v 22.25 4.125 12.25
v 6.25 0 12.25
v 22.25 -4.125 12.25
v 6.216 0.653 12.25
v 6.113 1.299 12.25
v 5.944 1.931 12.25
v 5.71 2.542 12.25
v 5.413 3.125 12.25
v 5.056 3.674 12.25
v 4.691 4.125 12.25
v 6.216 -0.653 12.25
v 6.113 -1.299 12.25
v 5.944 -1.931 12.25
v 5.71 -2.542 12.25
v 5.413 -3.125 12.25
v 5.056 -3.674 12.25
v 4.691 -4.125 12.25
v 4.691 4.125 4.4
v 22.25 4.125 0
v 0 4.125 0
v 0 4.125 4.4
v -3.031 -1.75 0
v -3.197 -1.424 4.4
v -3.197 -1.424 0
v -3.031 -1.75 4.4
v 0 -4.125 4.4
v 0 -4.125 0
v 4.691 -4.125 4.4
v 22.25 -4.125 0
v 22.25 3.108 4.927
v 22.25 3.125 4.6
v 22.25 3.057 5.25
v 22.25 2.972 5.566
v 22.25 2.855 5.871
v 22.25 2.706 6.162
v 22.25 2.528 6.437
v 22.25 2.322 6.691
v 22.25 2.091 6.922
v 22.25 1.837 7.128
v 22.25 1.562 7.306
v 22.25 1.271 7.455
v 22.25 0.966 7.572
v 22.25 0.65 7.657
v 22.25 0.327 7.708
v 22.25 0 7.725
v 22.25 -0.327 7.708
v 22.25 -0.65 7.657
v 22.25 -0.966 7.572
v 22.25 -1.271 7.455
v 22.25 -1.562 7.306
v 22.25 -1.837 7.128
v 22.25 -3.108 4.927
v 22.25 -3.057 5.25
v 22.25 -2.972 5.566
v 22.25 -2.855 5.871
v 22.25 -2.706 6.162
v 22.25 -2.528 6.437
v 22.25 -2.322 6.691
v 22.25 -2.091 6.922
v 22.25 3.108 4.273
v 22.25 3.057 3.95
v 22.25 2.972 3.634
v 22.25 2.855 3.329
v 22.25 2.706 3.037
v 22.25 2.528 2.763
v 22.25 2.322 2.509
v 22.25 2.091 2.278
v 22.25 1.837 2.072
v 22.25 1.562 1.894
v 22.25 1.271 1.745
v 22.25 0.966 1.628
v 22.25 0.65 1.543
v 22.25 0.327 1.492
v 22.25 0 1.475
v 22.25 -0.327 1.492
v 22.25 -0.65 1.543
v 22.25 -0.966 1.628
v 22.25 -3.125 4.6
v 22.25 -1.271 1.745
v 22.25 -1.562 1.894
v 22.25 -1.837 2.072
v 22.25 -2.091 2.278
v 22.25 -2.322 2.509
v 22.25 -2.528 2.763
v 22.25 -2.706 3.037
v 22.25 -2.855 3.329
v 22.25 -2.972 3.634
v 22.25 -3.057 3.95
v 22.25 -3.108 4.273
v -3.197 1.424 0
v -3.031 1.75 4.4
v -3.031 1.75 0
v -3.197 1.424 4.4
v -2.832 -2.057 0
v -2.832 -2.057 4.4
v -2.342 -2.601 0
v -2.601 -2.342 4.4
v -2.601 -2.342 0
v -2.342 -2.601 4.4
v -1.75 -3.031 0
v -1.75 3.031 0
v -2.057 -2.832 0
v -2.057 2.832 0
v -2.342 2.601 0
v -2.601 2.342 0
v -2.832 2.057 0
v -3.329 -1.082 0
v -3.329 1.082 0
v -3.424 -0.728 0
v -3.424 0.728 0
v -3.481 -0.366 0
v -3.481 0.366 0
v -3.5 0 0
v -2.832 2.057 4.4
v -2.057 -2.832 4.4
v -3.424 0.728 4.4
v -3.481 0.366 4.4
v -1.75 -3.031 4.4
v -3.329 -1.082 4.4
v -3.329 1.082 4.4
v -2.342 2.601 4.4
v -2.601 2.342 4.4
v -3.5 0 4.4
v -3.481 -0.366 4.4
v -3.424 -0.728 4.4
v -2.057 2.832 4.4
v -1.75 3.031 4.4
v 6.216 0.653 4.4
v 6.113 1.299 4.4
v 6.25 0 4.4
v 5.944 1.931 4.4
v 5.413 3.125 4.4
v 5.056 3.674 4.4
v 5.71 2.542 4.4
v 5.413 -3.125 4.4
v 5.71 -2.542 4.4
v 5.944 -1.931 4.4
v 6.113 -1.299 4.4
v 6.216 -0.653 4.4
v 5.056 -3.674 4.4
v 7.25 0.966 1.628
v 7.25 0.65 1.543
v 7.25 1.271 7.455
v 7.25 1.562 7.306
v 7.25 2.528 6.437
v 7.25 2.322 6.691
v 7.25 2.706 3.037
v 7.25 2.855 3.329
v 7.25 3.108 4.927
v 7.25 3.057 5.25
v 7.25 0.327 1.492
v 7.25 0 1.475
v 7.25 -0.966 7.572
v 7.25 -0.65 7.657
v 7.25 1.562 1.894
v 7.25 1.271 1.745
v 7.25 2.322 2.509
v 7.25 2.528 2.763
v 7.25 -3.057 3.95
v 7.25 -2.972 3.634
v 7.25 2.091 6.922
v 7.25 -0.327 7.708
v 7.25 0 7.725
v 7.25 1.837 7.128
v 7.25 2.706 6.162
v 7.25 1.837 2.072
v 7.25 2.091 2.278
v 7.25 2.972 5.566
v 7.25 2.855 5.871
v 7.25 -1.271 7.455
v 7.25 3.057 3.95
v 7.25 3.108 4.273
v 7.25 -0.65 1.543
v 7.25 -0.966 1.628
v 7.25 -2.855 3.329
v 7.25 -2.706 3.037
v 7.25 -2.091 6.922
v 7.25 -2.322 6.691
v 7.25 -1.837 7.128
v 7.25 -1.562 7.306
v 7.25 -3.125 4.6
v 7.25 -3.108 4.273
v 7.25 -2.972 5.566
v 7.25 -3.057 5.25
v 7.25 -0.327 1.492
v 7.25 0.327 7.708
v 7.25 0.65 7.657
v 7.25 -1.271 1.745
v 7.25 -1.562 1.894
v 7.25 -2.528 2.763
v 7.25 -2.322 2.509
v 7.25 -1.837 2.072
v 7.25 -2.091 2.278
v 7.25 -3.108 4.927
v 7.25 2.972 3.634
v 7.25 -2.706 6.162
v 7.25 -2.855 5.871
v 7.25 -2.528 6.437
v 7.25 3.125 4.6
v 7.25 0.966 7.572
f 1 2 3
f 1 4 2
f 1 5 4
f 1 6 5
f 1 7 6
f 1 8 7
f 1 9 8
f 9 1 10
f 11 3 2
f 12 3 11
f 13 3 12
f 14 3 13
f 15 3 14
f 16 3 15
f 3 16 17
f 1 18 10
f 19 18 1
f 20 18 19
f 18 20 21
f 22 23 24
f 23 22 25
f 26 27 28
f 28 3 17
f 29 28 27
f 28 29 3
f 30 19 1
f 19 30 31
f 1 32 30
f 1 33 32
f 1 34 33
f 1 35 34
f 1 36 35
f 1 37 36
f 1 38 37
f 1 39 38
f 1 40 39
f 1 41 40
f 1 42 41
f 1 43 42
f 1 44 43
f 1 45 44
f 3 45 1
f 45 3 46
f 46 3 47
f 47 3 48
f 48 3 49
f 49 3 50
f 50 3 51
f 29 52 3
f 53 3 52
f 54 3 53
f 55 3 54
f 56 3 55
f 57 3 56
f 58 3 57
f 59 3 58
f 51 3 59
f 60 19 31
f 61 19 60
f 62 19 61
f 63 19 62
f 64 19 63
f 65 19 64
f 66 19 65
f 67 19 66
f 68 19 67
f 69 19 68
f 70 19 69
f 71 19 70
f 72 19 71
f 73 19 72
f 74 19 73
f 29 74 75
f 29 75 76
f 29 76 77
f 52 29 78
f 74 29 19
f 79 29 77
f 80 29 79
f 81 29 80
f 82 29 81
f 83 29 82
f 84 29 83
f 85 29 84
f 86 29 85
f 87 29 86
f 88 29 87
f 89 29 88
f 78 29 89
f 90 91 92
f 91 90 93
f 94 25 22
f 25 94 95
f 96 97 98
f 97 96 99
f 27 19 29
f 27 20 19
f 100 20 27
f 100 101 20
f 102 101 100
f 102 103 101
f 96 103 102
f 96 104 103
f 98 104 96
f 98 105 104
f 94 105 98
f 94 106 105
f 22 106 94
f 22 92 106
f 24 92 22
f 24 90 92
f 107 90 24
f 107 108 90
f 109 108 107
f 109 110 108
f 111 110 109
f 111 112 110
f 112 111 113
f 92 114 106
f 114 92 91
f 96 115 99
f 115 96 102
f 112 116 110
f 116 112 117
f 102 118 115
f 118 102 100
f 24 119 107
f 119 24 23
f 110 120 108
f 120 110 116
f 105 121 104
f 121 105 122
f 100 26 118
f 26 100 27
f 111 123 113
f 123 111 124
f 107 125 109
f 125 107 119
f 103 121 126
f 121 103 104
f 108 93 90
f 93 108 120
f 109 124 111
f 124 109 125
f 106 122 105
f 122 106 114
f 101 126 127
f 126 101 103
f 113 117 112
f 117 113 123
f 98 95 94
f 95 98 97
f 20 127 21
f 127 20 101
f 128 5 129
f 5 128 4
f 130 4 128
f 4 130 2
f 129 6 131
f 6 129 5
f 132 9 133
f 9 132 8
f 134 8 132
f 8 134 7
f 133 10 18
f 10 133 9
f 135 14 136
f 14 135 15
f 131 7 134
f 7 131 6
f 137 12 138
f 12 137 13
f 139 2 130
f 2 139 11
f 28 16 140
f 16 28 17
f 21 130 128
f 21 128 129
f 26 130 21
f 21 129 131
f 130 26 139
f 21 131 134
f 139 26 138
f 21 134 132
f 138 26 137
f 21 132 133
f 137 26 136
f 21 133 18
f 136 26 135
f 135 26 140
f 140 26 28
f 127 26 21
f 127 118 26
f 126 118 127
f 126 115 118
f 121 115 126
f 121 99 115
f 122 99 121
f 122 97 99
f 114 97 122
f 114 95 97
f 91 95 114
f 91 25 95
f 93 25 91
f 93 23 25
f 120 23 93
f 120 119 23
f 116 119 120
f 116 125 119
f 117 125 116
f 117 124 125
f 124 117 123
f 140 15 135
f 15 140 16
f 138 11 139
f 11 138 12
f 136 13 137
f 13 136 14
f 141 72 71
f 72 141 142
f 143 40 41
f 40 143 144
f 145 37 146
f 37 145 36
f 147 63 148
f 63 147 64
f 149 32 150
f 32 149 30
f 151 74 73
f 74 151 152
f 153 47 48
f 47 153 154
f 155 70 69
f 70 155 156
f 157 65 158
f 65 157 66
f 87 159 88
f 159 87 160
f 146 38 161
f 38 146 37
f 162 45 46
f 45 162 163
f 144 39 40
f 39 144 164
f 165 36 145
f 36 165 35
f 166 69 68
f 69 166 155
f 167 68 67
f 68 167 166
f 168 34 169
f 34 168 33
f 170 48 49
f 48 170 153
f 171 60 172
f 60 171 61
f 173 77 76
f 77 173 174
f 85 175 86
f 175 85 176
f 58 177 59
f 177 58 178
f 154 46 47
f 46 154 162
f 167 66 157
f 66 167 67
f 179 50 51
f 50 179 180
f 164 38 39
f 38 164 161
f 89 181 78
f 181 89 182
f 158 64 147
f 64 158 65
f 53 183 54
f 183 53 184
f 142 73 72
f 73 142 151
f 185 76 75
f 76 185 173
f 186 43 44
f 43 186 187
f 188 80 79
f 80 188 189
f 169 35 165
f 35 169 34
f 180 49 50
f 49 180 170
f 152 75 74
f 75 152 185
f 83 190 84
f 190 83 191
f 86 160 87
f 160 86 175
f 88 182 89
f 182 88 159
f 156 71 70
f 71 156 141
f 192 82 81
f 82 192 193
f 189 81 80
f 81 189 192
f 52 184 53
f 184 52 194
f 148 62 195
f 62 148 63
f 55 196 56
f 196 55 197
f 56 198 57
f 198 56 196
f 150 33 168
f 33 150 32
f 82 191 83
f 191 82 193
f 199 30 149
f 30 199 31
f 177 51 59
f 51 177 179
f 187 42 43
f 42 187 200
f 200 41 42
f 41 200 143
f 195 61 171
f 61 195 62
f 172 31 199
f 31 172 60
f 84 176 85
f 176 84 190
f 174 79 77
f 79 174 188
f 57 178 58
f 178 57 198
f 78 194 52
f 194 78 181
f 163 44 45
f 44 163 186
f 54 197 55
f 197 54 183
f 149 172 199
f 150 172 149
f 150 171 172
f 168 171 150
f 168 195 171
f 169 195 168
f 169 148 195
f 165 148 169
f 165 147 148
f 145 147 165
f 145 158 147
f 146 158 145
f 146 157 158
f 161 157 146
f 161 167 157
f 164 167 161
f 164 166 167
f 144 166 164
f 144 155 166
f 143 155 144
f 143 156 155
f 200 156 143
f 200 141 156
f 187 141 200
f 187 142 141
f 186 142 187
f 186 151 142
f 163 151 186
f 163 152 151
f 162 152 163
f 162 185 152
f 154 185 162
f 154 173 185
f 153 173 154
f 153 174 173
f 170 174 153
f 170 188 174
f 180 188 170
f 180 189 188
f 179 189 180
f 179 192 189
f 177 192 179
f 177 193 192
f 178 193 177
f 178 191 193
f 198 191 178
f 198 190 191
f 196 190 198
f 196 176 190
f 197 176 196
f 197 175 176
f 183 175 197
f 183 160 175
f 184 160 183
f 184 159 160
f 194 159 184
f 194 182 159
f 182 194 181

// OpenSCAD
detail = 60;	//20=low, 80=high
height = 15;
barLength = 40;
holeDiam = 8;	//M8 bolt
ledgeThick = 2.5;
shaftDiam = 6+0.25;     //add a bit (6mm actual)
shaftPos = height/3;
shaftClampedLength = 15;
shaftPad = 1;

layer = 0.2;

m5bolt = 5;
m5boltHead = 8;
m3bolt = 3;
bearingDiam = 10+0.5;       //add a bit (10mm actual)
bearingThick = 4;
bearingPad = 2;                 //padding around the outside of the bearing outer
bearingMarg = 0.4;                //thickness under the ends of the bearing
bearingInterfaceDiam = 7;       //the nub that sticks up from the non-bearing side
shaftZ = (bearingThick + bearingMarg + bearingMarg/2); //was shaftPad+shaftDiam/2

tiny=0.001;

elbow2();

module elbow2() {
    difference() {
        hull() {
            cylinder(h=bearingThick+bearingMarg,d=bearingInterfaceDiam,$fn=detail);
            translate([0,-(shaftDiam+shaftPad*2)/2,0])cube([bearingPad+shaftClampedLength+bearingDiam/2,shaftDiam+shaftPad*2,shaftPad+m3bolt+shaftDiam+shaftPad*2]);
        }
        //remove bearing (clips top half sections)
        translate([0,0,bearingMarg+bearingThick])cylinder(h=m3bolt+shaftDiam+shaftPad*2,d=bearingDiam+bearingPad,$fn=detail);
        //shaft
        translate([bearingPad+bearingDiam/2,0,shaftZ])rotate([0,90,0])cylinder(h=shaftClampedLength,d=shaftDiam,$fn=detail);
    }
}

module elbow() {
    difference() {
        union() {
            difference() {
                //main body (bearing housing + shaft clamp)
                union() {
                    #cylinder(h=bearingThick+bearingMarg,d=bearingInterfaceDiam,$fn=detail);
                    translate([0,-(shaftDiam+shaftPad*2)/2,0])cube([bearingPad+shaftClampedLength+bearingDiam/2,shaftDiam+shaftPad*2,shaftPad+m3bolt+shaftDiam+shaftPad*2]);
                }
                //remove bearing (clips top half sections)
                translate([0,0,bearingMarg+bearingThick])cylinder(h=m3bolt+shaftDiam+shaftPad*2,d=bearingDiam+bearingPad,$fn=detail);
                //shaft
                translate([bearingPad+bearingDiam/2,0,shaftZ])rotate([0,90,0])cylinder(h=shaftClampedLength,d=shaftDiam,$fn=detail);
                //keyway for clamping
                translate([bearingPad+bearingDiam/2,-shaftDiam/8,shaftPad+shaftDiam/2])cube([bearingDiam/2+shaftClampedLength,shaftDiam/4,shaftDiam*2]);
                //clamp bolt
                translate([shaftClampedLength+bearingDiam/2-bearingPad,tiny/2+shaftPad+shaftDiam/2,shaftPad*2+shaftDiam+m3bolt/2])rotate([90,0,0])cylinder(h=tiny+shaftDiam+2*shaftPad,d=m3bolt,$fn=detail);
                //remove extra bits for pivot angle
                translate([0,0,bearingMarg+bearingThick])rotate([0,0,25])cube([bearingDiam,2*bearingPad,bearingDiam]);
                mirror([0,1,0])translate([0,0,bearingMarg+bearingThick])rotate([0,0,25])cube([bearingDiam,2*bearingPad,bearingDiam]);
            }
            translate([0,0,bearingThick+bearingMarg])cylinder(h=bearingMarg,d=bearingInterfaceDiam,$fn=detail);
        }
        //bolt hole
        cylinder(h=bearingThick+bearingMarg+bearingMarg,d=m5bolt,$fn=detail);
        //cylinder(h=bearingThick-bearingMarg,d=m5boltHead,$fn=detail);
    }
    //translate([-m5boltHead/2,-m5boltHead/2,bearingThick-bearingMarg])cube([m5boltHead,m5boltHead,0.2]);
}

module elbowBearing() {
    //needs clamping for bearing...
    difference() {
        //main body (bearing housing + shaft clamp)
        union() {
            cylinder(h=bearingThick+bearingMarg,d=bearingDiam+2*bearingPad,$fn=detail);
            translate([0,-(shaftDiam+shaftPad*2)/2,0])cube([bearingPad+shaftClampedLength+bearingDiam/2,shaftDiam+shaftPad*2,shaftPad+m3bolt+shaftDiam+shaftPad*2]);
            translate([-bearingDiam,-(shaftDiam+shaftPad*2)/2,0])cube([bearingDiam,shaftDiam+shaftPad*2,bearingThick+bearingMarg]);
        }
        //remove bearing
        translate([0,0,bearingMarg])cylinder(h=m3bolt+shaftDiam+shaftPad*4,d=bearingDiam+bearingPad,$fn=detail);
        //bolt hole
        cylinder(h=bearingThick,d=bearingInterfaceDiam,$fn=detail);
        //shaft
        translate([bearingPad+bearingDiam/2,0,shaftZ])rotate([0,90,0])cylinder(h=shaftClampedLength,d=shaftDiam,$fn=detail);
        //keyway for clamping
        translate([bearingPad+bearingDiam/2,-shaftDiam/8,shaftPad+shaftDiam/2])cube([bearingDiam/2+shaftClampedLength,shaftDiam/4,shaftDiam*2]);
        //clamp bolt
        translate([shaftClampedLength+bearingDiam/2-bearingPad,tiny/2+shaftPad+shaftDiam/2,shaftPad*2+shaftDiam+m3bolt/2])rotate([90,0,0])cylinder(h=tiny+shaftDiam+2*shaftPad,d=m3bolt,$fn=detail);
        //remove extra bits for pivot angle
        translate([0,0,bearingMarg+bearingThick])rotate([0,0,25])cube([bearingDiam,2*bearingPad,bearingDiam]);
        mirror([0,1,0])translate([0,0,bearingMarg+bearingThick])rotate([0,0,25])cube([bearingDiam,2*bearingPad,bearingDiam]);
        //keyway for bearing clamp
        translate([-bearingDiam,-shaftDiam/8,0])cube([bearingDiam,shaftDiam/4,bearingThick+bearingMarg]);
        //clamp bolt
        translate([-bearingDiam+bearingDiam/4,-(shaftDiam+2*shaftPad)/2,(bearingThick+bearingMarg)/2])rotate([90,0,180])boltHole(3,5.5,tiny+shaftDiam+2*shaftPad,3);
        translate([-bearingDiam+bearingDiam/4,3+(shaftDiam+2*shaftPad)/2,(bearingThick+bearingMarg)/2])rotate([90,0,180])boltHole(3,6.3,tiny+shaftDiam+2*shaftPad,3);
    }
    
}


module shaftMount() {
	difference() {
		union() {
			cylinder(h=height,d=holeDiam*2,$fn=detail);
			translate([0,-holeDiam,0])cube([barLength,holeDiam*2,height]);
		}
		cylinder(h=height,d=holeDiam,$fn=detail);
		translate([holeDiam,0,shaftPos])rotate([0,90,0]) {
			cylinder(h=barLength,d=shaftDiam,$fn=detail);
			translate([-height,-shaftDiam/4,0])cube([height,shaftDiam/2,barLength]);
		}
		translate([barLength-holeDiam,holeDiam-4.5,1.5+shaftPos+shaftDiam/2])rotate([90,0,0])boltHoleNut(7,5.7,12,3.5);
	}
	
}

module elbow1() {
	difference() {
		union() {
			cylinder(h=height,d=holeDiam*2,$fn=detail);
			translate([0,-holeDiam,0])cube([barLength,holeDiam*2,height]);
		}
		cylinder(h=height,d=m5bolt,$fn=detail);
		translate([0,0,height/2-0.5])cylinder(h=height,d=holeDiam*2+1,$fn=detail);	//assumes 1mm washer
		translate([0,0,height/2-0.5-bearingThick])cylinder(h=bearingThick,d=bearingDiam,$fn=detail);	//assumes 1mm washer
		translate([holeDiam,0,shaftPos])rotate([0,90,0]) {
			cylinder(h=barLength,d=shaftDiam,$fn=detail);
			translate([-height,-shaftDiam/4,0])cube([height,shaftDiam/2,barLength]);
		}
		translate([barLength-holeDiam,holeDiam-4.5,1.5+shaftPos+shaftDiam/2])rotate([90,0,0])boltHoleNut(7,5.7,12,3.5);
	}
}



module boltHole(headLength, headDiam, shaftLength, shaftDiam) {
 	//(M3)
	//head length std = 3mm
	//head diameter std = 5.5mm
	//shaft diameter std = 3mm
	//length defined
	union() {
		cylinder(h=shaftLength,d=shaftDiam,$fn=detail);
		translate([0,0,-headLength]) cylinder(h=headLength,d=headDiam,$fn=detail); //h=2.9
	}
}

module boltHoleNut(headLength, headDiam, shaftLength, shaftDiam) {
 	//(M3)
	//head length std = 3mm
	//head diameter std = 5.5mm
	//shaft diameter std = 3mm
	//length defined
	union() {
		cylinder(h=shaftLength,d=shaftDiam,$fn=detail);
		translate([0,0,-headLength]) cylinder(h=headLength,d=headDiam,$fn=detail); //h=2.9
		translate([0,0,shaftLength-2.4])cylinder(h=2.4,d=6.5,$fn=6);
	}
}
